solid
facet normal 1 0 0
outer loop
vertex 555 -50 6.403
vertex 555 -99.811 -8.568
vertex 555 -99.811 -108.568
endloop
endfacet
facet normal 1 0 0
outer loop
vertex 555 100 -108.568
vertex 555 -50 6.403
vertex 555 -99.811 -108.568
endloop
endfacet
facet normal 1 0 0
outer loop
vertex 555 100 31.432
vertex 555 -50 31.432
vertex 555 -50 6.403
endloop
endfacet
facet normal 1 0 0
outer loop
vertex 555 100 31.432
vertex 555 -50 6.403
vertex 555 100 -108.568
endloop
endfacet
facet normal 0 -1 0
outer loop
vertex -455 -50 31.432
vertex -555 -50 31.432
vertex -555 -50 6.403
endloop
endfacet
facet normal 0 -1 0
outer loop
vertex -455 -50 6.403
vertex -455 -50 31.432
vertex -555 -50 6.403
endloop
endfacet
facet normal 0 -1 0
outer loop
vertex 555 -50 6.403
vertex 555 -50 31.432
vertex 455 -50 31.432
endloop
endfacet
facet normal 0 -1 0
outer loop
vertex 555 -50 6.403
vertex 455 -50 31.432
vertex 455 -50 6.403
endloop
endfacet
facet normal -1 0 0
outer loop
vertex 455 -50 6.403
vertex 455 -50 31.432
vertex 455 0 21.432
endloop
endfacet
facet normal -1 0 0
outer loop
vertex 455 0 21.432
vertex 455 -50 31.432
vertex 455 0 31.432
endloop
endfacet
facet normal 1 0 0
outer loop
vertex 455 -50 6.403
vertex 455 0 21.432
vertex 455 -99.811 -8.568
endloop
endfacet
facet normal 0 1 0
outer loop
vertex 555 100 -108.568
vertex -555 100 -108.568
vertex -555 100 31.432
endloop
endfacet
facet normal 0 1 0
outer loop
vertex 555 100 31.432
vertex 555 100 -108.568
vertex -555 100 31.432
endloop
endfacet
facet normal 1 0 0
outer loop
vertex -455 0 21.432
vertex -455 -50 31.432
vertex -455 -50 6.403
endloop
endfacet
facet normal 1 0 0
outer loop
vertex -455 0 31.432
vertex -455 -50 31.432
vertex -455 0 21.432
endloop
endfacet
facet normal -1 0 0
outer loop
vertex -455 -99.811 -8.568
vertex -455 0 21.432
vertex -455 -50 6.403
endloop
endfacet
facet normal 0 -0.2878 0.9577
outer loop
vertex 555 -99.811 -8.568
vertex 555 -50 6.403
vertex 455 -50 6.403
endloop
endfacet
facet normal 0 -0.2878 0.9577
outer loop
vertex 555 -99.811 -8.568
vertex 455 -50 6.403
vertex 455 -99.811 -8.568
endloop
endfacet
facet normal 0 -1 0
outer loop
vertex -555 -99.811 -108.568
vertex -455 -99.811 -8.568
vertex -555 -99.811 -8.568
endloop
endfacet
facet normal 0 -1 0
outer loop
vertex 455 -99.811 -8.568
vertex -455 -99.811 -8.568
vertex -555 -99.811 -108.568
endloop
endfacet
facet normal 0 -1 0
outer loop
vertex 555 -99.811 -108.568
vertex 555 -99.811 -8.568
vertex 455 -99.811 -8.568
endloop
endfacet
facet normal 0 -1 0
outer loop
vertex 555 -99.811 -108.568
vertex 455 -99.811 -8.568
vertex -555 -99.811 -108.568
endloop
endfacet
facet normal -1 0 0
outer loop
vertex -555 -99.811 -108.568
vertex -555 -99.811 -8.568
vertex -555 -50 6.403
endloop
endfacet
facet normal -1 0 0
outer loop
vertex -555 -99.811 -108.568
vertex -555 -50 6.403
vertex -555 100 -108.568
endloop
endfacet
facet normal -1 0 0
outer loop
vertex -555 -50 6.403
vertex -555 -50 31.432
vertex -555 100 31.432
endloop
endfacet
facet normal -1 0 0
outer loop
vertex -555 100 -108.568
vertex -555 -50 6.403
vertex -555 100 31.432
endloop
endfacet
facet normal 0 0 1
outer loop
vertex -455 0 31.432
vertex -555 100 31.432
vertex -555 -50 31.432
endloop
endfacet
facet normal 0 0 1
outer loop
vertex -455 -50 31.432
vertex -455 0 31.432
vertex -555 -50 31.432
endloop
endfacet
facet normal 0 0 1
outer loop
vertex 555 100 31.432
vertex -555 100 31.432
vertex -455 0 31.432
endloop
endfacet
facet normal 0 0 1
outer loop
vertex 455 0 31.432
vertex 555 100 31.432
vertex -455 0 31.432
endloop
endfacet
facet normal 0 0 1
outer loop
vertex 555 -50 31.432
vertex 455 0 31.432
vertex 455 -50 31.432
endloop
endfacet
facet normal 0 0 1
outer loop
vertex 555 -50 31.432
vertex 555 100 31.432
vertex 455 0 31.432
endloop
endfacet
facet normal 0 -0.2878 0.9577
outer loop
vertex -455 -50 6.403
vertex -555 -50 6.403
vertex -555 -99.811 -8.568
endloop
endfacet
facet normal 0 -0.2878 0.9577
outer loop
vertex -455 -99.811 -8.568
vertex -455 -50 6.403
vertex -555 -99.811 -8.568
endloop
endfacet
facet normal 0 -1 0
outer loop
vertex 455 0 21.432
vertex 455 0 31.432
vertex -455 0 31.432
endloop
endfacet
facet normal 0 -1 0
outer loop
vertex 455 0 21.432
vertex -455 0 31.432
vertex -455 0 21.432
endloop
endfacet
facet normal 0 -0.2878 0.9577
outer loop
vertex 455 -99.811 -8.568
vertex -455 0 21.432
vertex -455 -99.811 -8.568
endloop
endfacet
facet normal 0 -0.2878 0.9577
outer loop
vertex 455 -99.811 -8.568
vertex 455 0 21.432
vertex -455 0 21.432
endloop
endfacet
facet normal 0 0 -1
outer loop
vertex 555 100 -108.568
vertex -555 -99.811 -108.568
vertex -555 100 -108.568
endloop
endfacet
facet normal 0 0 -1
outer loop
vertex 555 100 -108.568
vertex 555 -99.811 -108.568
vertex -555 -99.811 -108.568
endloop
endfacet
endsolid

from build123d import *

# Parameters (mm, degrees)
F1_DEPTH = 455
F3_DEPTH = 100


with BuildPart() as f1:
    # F0 (on Right) → F1 (new body)
    with BuildSketch(Plane.YZ):
        Polygon((100, 31.431883), (0, 31.431883), (0, 21.431883), (-99.810627, -8.568117), (-99.810627, -108.568117), (100, -108.568117), align=None)
    extrude(amount=F1_DEPTH)

    # F2 (on face) → F3 (join)
    with BuildSketch(Plane.YZ.offset(455)):
        Polygon((-99.810627, -108.568117), (100, -108.568117), (100, 31.431883), (0, 31.431883), (0, 21.431883), (-50, 6.403424), (-99.810627, -8.568117), align=None)
        Polygon((0, 21.431883), (0, 31.431883), (-50, 31.431883), (-50, 6.403424), align=None)
    extrude(amount=F3_DEPTH)

    # F4: F1 across face


with BuildPart() as f1_1:
    add(f1.part)
    add(f1.part.mirror(Plane(origin=(0, 5.969064, -44.0526), x_dir=(0, 1, 0), z_dir=(-1, 0, 0))))


solid = f1_1.part
